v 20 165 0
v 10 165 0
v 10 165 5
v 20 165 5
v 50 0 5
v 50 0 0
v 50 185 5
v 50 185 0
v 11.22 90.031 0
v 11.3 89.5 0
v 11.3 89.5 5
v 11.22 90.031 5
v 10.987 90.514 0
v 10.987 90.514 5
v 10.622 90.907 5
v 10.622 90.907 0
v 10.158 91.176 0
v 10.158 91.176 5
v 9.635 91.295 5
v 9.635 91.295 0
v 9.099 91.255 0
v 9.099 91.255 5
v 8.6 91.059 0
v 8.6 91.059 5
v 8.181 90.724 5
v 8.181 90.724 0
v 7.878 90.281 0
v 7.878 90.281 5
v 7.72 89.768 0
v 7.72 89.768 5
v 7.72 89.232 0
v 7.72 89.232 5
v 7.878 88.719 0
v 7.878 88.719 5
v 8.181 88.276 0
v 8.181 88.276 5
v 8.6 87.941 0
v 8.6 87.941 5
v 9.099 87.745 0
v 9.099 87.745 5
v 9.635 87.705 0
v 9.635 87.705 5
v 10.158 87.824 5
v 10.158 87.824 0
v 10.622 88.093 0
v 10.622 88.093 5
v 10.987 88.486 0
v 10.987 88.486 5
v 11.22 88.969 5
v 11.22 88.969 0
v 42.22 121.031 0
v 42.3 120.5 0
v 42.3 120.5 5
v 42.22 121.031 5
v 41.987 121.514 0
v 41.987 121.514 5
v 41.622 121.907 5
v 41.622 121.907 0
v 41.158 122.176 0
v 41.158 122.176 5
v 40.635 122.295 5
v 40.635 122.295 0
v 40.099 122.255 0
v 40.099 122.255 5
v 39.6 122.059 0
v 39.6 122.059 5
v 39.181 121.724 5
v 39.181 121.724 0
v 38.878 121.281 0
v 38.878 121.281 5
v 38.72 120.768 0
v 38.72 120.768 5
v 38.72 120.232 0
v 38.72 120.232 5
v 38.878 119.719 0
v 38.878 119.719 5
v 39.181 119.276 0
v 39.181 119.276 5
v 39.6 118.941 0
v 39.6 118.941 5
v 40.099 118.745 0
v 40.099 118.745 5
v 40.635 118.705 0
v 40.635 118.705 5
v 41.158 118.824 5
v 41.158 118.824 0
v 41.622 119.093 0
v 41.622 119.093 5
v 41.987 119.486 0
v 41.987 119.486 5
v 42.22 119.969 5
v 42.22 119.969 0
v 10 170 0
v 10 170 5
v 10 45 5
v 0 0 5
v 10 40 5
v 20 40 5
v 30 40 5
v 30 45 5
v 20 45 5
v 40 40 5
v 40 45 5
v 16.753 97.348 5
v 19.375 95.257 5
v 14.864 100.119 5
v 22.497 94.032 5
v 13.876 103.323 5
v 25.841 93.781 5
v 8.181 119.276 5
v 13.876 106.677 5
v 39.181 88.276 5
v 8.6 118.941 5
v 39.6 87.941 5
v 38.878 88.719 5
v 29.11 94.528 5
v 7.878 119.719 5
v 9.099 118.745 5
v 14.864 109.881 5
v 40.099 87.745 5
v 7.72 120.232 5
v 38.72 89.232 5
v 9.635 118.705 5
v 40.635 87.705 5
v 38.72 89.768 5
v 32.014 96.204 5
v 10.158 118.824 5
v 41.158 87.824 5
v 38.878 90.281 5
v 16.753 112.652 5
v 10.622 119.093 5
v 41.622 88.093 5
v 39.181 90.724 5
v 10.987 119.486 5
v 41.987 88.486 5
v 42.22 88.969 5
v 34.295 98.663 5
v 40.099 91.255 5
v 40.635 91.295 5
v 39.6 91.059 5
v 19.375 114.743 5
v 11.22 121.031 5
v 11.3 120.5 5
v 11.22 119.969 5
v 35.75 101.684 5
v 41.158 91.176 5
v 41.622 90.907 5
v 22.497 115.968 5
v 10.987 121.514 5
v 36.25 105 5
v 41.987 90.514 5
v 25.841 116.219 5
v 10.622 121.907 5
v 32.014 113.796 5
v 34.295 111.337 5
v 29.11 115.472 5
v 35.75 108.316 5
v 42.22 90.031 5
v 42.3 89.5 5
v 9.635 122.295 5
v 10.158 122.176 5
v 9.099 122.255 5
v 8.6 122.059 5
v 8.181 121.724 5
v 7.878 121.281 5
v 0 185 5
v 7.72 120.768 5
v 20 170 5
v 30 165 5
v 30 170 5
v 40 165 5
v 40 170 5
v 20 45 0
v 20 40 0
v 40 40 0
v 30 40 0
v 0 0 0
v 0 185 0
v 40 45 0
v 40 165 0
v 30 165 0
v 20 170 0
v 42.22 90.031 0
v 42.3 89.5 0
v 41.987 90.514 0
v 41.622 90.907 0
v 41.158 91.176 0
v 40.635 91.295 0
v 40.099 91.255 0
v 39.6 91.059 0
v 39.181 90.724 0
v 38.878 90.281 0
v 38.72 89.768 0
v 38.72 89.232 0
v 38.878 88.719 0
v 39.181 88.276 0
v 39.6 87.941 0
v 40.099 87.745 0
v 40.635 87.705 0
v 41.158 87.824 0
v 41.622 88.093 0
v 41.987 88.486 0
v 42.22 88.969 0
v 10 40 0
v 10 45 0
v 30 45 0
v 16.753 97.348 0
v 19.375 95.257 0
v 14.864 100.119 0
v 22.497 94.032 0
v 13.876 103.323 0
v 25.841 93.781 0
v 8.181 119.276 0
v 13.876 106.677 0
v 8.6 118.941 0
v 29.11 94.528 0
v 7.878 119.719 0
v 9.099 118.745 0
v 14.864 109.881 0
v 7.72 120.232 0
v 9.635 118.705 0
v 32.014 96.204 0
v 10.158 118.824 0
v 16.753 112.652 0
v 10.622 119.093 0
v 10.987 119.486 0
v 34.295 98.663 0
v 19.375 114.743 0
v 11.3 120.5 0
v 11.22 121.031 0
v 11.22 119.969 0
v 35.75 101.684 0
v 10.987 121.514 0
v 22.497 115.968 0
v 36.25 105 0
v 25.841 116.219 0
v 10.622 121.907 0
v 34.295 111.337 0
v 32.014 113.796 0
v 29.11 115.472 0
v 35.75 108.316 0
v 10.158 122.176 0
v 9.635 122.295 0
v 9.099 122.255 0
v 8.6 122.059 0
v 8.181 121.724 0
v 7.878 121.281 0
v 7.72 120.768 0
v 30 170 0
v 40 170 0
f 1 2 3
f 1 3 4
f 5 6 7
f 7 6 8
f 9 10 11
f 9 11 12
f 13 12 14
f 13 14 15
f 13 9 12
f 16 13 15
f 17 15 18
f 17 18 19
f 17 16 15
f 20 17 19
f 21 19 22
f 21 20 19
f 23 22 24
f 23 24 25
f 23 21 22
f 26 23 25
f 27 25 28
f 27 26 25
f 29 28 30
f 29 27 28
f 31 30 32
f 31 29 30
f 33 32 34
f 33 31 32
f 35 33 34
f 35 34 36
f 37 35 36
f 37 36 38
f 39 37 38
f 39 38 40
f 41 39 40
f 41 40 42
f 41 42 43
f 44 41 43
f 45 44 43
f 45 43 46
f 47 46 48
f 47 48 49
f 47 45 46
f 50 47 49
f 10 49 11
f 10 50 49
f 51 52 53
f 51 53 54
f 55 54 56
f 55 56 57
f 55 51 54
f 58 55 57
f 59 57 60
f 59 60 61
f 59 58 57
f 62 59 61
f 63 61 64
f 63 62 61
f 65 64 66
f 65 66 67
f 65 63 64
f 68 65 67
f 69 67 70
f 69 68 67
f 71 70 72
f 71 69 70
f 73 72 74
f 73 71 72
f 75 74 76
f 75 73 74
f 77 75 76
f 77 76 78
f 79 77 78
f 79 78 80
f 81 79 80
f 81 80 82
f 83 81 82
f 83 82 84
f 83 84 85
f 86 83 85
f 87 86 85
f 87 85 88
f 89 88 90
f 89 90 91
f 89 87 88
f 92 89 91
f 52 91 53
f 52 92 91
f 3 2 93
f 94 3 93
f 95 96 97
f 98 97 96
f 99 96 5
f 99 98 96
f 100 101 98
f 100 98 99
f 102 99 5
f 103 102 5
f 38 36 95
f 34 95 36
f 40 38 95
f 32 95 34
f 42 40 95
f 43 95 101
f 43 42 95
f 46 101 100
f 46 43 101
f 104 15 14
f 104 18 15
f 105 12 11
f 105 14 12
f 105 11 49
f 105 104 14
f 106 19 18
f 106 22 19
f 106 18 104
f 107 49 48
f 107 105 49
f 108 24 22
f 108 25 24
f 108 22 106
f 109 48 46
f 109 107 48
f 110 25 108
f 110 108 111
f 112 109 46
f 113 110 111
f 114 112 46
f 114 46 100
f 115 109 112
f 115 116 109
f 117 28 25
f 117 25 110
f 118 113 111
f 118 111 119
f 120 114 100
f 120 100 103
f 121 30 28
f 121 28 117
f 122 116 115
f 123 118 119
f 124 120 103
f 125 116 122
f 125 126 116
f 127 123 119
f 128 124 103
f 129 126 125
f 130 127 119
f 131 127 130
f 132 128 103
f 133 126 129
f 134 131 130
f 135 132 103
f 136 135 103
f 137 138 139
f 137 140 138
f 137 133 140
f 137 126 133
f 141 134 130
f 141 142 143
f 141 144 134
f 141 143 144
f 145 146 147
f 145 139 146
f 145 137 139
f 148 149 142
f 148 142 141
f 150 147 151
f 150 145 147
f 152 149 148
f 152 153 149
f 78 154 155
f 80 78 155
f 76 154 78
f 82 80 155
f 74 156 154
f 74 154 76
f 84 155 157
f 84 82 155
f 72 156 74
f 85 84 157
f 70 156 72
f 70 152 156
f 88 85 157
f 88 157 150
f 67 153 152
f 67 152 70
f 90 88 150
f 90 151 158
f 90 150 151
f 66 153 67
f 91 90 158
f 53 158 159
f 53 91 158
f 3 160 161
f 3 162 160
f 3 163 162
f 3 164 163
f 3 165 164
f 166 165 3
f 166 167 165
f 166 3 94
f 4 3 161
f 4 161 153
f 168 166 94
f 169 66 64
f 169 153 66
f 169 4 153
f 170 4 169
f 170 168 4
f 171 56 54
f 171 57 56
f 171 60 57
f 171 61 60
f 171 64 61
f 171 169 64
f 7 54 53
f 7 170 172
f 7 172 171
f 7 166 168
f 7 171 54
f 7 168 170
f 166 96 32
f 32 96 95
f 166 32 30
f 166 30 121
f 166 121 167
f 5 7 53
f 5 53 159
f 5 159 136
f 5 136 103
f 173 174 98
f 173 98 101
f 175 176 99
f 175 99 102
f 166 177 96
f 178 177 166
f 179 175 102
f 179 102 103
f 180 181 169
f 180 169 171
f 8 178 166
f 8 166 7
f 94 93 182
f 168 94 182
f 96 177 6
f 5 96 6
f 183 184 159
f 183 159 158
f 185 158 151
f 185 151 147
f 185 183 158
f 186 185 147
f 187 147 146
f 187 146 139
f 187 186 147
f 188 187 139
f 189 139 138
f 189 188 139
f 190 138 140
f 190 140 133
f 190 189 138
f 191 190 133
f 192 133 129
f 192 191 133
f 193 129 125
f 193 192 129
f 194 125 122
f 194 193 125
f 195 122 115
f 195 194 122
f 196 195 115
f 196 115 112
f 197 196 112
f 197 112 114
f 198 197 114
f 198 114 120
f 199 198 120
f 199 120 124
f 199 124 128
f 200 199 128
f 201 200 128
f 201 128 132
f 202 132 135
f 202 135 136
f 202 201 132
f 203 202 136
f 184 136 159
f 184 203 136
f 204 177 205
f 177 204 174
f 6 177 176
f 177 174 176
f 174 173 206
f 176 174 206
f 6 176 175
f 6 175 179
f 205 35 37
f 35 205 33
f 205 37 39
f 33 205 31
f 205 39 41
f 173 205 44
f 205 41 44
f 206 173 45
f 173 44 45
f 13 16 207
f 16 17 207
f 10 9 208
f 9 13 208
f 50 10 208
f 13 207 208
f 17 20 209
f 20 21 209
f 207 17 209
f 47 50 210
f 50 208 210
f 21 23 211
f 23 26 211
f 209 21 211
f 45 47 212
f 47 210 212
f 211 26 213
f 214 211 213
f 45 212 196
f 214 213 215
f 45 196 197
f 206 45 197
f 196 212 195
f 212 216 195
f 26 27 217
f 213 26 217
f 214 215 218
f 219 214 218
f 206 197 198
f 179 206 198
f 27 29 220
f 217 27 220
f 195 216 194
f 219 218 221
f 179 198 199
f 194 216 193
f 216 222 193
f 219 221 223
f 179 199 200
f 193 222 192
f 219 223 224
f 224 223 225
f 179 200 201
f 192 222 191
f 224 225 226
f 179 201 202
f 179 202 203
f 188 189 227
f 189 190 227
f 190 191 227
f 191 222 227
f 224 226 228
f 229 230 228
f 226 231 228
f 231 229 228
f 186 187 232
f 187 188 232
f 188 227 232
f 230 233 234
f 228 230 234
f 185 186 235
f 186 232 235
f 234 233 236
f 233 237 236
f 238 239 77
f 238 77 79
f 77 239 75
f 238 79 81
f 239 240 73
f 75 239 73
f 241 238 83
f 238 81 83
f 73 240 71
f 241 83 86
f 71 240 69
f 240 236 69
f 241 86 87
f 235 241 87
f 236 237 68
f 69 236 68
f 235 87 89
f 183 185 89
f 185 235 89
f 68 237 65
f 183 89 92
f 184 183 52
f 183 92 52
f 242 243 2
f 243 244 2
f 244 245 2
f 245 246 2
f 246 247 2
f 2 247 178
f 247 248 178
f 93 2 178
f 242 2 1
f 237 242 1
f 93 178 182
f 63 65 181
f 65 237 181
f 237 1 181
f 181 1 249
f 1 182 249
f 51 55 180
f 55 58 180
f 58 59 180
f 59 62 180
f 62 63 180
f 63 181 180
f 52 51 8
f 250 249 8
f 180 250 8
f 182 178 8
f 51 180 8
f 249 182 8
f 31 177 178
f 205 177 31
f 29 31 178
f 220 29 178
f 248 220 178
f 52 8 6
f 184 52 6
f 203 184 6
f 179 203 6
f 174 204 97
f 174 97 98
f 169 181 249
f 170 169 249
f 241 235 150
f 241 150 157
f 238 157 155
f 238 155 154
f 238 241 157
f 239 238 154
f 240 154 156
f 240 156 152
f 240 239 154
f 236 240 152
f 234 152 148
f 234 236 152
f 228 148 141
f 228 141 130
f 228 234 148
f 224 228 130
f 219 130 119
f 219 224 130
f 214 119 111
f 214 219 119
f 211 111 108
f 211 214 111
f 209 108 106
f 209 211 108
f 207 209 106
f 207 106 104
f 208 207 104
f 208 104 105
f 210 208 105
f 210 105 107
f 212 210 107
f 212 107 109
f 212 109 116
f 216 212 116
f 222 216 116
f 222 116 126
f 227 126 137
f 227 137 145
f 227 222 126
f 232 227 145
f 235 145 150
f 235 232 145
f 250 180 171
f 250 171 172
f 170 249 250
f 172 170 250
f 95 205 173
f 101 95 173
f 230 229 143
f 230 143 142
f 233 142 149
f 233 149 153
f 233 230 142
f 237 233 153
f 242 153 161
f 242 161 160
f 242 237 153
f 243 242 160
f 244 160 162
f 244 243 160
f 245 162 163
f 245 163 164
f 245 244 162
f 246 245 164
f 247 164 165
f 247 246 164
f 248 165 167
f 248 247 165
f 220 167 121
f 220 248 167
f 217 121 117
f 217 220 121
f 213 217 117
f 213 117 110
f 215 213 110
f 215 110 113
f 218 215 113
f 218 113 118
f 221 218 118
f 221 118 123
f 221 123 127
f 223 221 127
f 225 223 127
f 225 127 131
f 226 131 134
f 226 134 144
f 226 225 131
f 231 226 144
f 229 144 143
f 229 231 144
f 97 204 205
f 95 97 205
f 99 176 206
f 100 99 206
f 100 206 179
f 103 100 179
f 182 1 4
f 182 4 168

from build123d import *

# Parameters (mm, degrees)
SKETCH1_W           = 50
SKETCH1_H           = 185
SKETCH1_R           = 11.25
SKETCH1_R_2         = 1.8
SKETCH1_W_2         = 10
SKETCH1_H_2         = 5
BOSS_EXTRUDE1_DEPTH = 5


with BuildPart() as part:
    # Sketch1 → Boss-Extrude1 (new body)
    with BuildSketch(Plane.XY):
        with Locations((25, 92.5)):
            Rectangle(SKETCH1_W, SKETCH1_H)
        with Locations((25, 105)):
            Circle(SKETCH1_R, mode=Mode.SUBTRACT)
        with Locations((9.5, 120.5)):
            Circle(SKETCH1_R_2, mode=Mode.SUBTRACT)
        with Locations((9.5, 89.5)):
            Circle(SKETCH1_R_2, mode=Mode.SUBTRACT)
        with Locations((40.5, 89.5)):
            Circle(SKETCH1_R_2, mode=Mode.SUBTRACT)
        with Locations((40.5, 120.5)):
            Circle(SKETCH1_R_2, mode=Mode.SUBTRACT)
        with Locations((15, 167.5)):
            Rectangle(SKETCH1_W_2, SKETCH1_H_2, mode=Mode.SUBTRACT)
        with Locations((15, 42.5)):
            Rectangle(SKETCH1_W_2, SKETCH1_H_2, mode=Mode.SUBTRACT)
        with Locations((35, 42.5)):
            Rectangle(SKETCH1_W_2, SKETCH1_H_2, mode=Mode.SUBTRACT)
        with Locations((35, 167.5)):
            Rectangle(SKETCH1_W_2, SKETCH1_H_2, mode=Mode.SUBTRACT)
    extrude(amount=BOSS_EXTRUDE1_DEPTH)


solid = part.part
